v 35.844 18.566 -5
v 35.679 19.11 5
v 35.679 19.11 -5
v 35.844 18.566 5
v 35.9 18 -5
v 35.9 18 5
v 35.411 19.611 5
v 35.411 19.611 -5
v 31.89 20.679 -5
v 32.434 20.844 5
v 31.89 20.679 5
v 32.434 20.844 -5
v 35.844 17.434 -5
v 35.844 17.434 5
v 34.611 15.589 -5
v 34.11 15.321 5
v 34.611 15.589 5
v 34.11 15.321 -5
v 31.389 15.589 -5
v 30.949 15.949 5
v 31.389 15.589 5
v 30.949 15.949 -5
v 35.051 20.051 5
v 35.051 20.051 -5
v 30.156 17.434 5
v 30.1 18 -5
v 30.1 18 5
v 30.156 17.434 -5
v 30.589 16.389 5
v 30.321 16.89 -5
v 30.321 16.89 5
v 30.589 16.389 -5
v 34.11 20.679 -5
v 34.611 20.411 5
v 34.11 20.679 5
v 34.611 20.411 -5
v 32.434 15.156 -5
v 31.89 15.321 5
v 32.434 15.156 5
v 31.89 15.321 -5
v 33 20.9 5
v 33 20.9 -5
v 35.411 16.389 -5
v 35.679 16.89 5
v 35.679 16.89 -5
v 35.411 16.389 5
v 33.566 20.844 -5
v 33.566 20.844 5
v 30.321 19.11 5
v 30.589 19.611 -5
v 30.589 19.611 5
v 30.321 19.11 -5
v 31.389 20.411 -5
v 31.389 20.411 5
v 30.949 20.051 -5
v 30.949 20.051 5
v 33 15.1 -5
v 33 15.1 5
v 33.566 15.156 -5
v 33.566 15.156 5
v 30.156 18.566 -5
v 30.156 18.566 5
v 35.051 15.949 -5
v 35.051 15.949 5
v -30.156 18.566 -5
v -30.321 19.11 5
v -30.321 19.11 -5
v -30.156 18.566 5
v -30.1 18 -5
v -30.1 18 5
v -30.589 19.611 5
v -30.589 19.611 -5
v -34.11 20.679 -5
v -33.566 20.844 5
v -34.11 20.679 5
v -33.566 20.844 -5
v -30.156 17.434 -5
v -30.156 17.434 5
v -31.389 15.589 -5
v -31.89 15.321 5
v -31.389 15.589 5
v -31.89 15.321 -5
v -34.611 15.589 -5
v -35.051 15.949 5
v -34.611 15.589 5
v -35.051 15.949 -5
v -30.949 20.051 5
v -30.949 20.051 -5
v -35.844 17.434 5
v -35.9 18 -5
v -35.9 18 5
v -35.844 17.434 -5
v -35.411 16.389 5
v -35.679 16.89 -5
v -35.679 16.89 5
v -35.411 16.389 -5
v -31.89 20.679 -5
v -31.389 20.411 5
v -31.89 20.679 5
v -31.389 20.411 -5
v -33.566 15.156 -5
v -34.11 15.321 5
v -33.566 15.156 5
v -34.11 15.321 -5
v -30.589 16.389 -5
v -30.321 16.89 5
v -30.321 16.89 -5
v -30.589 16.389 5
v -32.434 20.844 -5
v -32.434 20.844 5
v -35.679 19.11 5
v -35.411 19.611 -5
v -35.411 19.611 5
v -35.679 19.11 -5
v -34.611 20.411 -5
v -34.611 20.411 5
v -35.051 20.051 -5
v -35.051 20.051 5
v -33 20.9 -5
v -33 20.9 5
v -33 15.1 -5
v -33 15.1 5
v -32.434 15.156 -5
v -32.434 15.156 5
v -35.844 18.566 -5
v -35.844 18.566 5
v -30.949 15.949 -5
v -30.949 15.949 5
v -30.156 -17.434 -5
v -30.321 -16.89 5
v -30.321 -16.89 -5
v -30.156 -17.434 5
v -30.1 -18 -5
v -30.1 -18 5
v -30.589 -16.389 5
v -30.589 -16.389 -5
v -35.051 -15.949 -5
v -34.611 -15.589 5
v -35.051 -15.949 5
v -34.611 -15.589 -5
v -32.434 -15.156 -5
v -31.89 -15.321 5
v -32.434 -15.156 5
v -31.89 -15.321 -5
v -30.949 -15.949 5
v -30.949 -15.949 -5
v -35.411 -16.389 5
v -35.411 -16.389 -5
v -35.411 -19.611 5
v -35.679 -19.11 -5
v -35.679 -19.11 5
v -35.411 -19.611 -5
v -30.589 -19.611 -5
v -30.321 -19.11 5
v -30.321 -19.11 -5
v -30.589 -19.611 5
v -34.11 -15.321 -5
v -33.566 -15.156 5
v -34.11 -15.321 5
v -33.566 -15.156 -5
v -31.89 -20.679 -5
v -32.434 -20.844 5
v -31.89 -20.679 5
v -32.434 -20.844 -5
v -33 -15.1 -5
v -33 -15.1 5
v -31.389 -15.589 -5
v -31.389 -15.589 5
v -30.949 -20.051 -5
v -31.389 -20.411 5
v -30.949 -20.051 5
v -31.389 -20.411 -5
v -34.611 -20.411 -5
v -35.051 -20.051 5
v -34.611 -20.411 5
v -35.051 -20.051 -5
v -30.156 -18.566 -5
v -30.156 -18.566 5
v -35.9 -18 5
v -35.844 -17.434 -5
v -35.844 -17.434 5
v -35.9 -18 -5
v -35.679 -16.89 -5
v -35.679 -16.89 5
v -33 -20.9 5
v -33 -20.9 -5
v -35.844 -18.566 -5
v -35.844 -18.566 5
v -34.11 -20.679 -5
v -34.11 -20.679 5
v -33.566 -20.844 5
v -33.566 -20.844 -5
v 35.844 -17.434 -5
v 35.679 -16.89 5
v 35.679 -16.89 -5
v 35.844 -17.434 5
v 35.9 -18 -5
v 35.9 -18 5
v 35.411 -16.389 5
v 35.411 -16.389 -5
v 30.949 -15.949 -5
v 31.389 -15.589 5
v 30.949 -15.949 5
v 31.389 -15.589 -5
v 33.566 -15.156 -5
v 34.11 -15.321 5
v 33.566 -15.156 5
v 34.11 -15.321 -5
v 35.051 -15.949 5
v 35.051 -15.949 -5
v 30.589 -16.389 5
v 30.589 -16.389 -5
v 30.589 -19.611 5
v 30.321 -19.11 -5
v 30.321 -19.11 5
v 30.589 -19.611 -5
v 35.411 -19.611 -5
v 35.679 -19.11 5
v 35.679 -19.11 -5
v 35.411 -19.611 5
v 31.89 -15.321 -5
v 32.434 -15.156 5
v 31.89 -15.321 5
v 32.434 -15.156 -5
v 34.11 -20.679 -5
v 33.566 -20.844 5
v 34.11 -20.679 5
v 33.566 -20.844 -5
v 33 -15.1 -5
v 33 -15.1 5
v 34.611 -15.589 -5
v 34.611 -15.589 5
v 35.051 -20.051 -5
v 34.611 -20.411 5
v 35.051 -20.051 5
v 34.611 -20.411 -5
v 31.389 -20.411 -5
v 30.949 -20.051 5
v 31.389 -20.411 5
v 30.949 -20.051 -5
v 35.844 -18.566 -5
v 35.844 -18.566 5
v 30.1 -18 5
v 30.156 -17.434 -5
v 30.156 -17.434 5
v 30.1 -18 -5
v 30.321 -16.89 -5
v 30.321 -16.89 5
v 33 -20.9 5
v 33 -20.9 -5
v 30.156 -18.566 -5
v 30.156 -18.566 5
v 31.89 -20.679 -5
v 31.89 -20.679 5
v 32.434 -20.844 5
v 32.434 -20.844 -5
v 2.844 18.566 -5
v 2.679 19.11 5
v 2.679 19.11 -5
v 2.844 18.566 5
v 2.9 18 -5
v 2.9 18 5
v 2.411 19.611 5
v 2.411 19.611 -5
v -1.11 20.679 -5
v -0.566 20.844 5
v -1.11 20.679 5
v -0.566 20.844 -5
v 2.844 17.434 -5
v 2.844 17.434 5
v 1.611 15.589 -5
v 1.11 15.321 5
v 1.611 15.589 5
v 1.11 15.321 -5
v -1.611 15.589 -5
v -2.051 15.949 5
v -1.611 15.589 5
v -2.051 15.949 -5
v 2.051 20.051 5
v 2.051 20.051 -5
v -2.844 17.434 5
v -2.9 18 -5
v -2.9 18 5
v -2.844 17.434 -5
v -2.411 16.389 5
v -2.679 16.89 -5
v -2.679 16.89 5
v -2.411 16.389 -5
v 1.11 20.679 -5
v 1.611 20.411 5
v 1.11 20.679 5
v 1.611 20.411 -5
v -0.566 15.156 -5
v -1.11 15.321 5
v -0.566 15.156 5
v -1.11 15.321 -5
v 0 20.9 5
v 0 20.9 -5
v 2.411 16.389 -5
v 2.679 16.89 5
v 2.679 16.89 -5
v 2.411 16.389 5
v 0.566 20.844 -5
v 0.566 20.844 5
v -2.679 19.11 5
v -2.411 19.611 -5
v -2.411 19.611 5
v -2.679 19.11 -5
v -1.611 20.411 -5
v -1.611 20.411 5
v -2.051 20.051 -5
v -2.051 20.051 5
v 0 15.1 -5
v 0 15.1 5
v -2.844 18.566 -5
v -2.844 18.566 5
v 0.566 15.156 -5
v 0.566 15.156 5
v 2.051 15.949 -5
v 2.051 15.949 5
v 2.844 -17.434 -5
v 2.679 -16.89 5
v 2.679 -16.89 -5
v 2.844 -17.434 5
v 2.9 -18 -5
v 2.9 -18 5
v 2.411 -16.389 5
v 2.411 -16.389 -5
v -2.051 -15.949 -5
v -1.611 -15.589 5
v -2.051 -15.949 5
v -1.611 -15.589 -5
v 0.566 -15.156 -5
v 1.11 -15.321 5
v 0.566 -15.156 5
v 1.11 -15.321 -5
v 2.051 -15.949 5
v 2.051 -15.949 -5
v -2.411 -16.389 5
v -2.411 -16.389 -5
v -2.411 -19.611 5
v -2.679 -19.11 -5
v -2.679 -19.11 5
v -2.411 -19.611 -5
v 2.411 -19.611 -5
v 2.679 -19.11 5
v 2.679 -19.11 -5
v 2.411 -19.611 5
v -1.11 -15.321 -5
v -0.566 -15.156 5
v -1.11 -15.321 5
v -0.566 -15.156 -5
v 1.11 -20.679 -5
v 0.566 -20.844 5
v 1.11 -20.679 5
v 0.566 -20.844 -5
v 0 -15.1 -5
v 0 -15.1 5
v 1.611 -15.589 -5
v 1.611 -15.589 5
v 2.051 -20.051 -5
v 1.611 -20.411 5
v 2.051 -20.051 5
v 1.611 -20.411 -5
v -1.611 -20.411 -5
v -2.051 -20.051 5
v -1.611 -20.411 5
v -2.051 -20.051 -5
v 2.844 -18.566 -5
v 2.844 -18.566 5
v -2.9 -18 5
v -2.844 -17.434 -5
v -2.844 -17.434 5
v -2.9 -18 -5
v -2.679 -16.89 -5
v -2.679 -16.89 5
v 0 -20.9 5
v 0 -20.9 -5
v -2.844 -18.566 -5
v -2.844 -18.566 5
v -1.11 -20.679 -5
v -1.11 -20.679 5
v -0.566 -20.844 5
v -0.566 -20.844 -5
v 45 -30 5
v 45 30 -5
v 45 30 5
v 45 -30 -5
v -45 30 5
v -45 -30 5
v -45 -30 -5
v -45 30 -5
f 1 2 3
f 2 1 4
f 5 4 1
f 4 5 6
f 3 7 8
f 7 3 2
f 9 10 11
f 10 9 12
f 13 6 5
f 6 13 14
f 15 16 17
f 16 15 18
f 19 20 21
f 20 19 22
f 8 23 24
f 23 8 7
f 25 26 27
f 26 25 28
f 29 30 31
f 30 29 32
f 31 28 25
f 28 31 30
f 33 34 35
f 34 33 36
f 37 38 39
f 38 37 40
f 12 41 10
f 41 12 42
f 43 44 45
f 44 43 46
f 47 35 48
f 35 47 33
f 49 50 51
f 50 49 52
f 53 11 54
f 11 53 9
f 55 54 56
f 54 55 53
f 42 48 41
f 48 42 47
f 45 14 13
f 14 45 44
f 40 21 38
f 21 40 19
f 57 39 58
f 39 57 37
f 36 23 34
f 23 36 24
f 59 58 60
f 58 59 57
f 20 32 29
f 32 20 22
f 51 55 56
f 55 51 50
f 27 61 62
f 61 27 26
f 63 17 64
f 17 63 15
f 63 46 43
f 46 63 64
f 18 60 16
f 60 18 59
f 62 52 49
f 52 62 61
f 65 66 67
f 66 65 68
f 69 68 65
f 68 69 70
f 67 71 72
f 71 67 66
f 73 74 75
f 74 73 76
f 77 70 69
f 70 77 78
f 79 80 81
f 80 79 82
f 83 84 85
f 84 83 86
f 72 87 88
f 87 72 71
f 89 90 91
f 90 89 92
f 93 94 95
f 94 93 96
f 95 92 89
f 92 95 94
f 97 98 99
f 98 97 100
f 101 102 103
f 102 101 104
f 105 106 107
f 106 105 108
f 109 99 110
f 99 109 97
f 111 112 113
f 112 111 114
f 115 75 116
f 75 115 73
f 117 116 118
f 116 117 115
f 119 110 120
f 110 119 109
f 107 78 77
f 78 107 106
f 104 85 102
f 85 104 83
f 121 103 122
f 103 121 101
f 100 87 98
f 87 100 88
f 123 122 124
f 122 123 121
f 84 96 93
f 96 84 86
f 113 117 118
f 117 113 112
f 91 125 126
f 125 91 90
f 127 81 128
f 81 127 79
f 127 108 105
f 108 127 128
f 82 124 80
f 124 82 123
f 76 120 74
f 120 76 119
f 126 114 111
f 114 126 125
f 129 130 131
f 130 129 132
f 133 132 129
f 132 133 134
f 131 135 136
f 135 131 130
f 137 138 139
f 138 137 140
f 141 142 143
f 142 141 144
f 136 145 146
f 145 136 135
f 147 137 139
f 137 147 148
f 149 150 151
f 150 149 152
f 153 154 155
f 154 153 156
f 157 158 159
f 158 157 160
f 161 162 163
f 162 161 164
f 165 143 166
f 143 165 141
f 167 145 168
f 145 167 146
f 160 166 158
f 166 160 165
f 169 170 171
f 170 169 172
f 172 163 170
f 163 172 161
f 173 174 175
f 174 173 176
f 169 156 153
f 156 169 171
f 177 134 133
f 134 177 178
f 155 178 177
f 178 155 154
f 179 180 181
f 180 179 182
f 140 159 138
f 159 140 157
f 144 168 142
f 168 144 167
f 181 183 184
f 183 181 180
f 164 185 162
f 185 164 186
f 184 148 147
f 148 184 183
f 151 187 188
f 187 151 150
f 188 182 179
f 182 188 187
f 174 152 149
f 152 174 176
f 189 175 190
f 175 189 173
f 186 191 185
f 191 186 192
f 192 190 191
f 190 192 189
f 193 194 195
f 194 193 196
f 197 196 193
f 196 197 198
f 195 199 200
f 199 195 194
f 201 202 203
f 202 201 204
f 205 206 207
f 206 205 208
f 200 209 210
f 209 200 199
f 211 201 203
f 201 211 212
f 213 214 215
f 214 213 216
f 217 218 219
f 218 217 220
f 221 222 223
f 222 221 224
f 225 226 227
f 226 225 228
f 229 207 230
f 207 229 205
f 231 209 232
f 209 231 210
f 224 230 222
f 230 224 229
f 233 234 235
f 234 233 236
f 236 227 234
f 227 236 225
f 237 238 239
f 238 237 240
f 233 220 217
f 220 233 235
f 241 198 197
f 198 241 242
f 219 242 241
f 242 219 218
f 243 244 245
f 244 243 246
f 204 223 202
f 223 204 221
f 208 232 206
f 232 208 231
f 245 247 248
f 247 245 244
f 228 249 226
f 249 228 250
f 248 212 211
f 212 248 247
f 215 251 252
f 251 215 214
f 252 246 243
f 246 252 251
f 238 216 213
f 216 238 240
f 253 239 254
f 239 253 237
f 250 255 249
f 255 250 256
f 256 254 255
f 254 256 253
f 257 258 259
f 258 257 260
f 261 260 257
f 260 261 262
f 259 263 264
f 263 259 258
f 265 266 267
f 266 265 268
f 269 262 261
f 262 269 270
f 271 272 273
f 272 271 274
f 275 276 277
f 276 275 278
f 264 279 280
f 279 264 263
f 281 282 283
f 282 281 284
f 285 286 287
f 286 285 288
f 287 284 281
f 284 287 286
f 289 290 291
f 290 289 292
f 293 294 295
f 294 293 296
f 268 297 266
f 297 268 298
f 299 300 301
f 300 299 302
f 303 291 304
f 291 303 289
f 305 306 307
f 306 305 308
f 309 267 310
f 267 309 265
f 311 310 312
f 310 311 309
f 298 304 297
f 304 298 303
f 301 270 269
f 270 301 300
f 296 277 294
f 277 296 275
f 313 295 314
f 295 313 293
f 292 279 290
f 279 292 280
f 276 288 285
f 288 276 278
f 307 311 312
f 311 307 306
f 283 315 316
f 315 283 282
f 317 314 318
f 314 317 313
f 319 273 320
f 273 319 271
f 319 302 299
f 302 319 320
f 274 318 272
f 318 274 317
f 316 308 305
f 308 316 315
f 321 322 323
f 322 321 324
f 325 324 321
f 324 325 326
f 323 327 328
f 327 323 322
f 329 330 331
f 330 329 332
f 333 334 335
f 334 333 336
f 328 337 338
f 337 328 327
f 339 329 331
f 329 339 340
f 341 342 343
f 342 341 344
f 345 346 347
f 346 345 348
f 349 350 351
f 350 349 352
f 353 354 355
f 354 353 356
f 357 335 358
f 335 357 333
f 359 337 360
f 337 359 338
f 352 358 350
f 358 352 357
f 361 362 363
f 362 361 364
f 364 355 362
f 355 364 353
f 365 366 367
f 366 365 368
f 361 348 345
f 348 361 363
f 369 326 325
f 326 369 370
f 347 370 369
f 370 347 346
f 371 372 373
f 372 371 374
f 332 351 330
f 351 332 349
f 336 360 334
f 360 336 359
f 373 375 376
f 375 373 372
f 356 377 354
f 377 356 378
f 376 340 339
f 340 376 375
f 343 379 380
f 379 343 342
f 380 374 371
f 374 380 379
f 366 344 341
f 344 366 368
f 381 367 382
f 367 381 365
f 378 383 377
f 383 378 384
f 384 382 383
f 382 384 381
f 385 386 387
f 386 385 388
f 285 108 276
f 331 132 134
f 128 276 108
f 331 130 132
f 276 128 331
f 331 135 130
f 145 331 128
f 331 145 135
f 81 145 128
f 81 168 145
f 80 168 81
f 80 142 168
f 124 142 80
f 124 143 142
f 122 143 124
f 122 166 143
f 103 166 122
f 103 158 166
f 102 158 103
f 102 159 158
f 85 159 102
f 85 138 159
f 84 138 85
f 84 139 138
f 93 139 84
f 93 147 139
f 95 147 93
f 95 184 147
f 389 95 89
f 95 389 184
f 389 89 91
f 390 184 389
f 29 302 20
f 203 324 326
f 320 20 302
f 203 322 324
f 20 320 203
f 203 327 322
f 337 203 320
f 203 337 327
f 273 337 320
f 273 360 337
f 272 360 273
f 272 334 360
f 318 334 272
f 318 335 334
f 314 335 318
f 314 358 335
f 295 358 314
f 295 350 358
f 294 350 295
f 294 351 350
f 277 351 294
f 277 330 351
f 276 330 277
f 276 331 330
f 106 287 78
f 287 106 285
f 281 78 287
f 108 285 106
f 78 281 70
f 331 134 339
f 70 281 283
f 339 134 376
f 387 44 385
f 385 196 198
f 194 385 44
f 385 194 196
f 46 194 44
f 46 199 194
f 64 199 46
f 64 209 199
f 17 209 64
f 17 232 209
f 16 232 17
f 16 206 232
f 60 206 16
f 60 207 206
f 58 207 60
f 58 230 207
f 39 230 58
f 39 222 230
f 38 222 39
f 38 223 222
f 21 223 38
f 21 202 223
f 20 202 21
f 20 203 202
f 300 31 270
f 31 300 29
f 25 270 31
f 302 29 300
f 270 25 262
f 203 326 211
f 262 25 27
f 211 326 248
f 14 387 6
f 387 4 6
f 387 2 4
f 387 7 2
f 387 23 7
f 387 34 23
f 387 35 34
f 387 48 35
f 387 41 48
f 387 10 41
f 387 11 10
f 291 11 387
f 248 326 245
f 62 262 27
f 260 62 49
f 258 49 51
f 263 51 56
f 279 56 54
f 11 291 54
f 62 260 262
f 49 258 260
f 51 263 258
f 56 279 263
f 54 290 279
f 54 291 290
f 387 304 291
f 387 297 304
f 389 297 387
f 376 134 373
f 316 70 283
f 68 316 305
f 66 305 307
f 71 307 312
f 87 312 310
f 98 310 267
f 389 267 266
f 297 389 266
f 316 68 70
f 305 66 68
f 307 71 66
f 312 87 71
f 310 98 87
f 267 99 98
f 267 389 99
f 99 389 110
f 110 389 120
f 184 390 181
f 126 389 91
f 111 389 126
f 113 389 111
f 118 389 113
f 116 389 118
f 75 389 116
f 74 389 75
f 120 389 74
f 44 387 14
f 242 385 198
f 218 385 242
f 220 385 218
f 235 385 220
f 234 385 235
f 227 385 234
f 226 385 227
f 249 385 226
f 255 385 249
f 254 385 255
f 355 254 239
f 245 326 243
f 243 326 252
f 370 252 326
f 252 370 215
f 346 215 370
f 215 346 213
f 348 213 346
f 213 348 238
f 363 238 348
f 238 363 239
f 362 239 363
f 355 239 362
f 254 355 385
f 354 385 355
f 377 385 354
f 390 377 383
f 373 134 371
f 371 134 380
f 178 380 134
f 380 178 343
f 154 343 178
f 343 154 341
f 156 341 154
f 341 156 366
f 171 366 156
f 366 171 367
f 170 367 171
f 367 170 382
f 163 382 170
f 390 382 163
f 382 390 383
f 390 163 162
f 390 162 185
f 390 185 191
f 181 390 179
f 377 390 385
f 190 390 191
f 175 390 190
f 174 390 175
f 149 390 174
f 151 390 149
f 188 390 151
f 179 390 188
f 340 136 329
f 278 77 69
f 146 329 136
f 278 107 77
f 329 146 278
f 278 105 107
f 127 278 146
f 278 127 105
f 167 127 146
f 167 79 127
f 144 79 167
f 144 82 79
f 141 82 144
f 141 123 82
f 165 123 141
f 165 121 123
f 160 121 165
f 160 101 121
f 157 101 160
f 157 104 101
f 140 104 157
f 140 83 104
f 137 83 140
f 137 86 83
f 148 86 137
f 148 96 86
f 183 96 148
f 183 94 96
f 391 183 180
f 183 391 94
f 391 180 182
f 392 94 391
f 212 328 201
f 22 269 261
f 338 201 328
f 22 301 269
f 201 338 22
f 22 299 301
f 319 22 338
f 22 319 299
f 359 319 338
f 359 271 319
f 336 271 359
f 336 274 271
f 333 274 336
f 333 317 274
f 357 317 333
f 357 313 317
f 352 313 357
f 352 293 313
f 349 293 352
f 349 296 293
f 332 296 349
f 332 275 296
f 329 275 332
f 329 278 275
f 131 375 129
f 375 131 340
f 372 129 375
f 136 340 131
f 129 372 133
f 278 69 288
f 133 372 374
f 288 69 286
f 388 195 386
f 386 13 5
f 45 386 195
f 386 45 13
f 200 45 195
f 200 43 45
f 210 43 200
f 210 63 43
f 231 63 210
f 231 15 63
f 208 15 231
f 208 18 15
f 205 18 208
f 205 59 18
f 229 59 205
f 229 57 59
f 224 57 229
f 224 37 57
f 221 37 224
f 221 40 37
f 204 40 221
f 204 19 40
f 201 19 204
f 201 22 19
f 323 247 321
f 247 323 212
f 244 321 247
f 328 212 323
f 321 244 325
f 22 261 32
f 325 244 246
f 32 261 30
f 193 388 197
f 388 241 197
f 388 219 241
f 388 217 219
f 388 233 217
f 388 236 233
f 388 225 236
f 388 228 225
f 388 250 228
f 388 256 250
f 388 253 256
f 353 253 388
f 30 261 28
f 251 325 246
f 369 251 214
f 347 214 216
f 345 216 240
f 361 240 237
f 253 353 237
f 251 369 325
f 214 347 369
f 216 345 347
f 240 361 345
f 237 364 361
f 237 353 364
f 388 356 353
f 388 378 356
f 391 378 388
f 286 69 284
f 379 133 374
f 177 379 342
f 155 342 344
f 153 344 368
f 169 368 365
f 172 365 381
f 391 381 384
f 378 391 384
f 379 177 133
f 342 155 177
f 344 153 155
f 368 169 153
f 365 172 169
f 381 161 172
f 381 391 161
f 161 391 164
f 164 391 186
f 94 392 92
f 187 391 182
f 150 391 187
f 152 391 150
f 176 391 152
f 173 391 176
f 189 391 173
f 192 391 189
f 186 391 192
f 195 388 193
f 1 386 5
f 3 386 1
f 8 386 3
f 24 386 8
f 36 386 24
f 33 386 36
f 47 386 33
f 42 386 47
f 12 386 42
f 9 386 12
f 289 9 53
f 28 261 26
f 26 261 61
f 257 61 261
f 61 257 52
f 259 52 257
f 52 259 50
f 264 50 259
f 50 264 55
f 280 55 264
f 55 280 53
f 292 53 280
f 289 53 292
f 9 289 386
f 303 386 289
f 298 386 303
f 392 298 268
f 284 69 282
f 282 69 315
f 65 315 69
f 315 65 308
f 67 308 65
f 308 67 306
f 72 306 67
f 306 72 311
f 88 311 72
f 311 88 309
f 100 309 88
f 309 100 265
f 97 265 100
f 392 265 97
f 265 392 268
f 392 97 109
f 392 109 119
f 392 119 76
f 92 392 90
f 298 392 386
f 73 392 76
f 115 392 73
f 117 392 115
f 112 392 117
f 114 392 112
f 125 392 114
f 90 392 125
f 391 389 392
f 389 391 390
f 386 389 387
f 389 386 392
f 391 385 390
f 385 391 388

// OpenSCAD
$fn = 32;

// ----------------------------------------------------------------------
// Corner plate 90 x 60 x 10
// 6 holes, centres taken from the edge offset
// ----------------------------------------------------------------------

// --- parameters (mm) ---
plate = [90, 60, 10];   // overall size (x, y, z)
holes = 6;              // number of holes the drawing asks for
bore_d = 5.5;           // nominal hole diameter from the drawing
print_allowance = 0.3;  // clearance added for printing
edge = 12;              // hole centre offset from the plate edge

// --- derived feature positions (mm) ---
hole_d = bore_d + print_allowance;  // = 5.8   hole diameter as printed
corner_x = plate[0] / 2 - edge;     // = 33   corner hole X
corner_y = plate[1] / 2 - edge;     // = 18   corner hole Y
feature_centers = [
  [corner_x, corner_y],
  [-corner_x, corner_y],
  [-corner_x, -corner_y],
  [corner_x, -corner_y],
  [0, corner_y],
  [0, -corner_y]
];   // hole centres the loop below drills

// plate outline, every hole drilled through with the same cutters
difference() {
  cube(plate, center = true);
  for (centre = feature_centers)
    translate([centre[0], centre[1], 0])
      cylinder(d = hole_d, h = plate[2] + 2, center = true);
}
